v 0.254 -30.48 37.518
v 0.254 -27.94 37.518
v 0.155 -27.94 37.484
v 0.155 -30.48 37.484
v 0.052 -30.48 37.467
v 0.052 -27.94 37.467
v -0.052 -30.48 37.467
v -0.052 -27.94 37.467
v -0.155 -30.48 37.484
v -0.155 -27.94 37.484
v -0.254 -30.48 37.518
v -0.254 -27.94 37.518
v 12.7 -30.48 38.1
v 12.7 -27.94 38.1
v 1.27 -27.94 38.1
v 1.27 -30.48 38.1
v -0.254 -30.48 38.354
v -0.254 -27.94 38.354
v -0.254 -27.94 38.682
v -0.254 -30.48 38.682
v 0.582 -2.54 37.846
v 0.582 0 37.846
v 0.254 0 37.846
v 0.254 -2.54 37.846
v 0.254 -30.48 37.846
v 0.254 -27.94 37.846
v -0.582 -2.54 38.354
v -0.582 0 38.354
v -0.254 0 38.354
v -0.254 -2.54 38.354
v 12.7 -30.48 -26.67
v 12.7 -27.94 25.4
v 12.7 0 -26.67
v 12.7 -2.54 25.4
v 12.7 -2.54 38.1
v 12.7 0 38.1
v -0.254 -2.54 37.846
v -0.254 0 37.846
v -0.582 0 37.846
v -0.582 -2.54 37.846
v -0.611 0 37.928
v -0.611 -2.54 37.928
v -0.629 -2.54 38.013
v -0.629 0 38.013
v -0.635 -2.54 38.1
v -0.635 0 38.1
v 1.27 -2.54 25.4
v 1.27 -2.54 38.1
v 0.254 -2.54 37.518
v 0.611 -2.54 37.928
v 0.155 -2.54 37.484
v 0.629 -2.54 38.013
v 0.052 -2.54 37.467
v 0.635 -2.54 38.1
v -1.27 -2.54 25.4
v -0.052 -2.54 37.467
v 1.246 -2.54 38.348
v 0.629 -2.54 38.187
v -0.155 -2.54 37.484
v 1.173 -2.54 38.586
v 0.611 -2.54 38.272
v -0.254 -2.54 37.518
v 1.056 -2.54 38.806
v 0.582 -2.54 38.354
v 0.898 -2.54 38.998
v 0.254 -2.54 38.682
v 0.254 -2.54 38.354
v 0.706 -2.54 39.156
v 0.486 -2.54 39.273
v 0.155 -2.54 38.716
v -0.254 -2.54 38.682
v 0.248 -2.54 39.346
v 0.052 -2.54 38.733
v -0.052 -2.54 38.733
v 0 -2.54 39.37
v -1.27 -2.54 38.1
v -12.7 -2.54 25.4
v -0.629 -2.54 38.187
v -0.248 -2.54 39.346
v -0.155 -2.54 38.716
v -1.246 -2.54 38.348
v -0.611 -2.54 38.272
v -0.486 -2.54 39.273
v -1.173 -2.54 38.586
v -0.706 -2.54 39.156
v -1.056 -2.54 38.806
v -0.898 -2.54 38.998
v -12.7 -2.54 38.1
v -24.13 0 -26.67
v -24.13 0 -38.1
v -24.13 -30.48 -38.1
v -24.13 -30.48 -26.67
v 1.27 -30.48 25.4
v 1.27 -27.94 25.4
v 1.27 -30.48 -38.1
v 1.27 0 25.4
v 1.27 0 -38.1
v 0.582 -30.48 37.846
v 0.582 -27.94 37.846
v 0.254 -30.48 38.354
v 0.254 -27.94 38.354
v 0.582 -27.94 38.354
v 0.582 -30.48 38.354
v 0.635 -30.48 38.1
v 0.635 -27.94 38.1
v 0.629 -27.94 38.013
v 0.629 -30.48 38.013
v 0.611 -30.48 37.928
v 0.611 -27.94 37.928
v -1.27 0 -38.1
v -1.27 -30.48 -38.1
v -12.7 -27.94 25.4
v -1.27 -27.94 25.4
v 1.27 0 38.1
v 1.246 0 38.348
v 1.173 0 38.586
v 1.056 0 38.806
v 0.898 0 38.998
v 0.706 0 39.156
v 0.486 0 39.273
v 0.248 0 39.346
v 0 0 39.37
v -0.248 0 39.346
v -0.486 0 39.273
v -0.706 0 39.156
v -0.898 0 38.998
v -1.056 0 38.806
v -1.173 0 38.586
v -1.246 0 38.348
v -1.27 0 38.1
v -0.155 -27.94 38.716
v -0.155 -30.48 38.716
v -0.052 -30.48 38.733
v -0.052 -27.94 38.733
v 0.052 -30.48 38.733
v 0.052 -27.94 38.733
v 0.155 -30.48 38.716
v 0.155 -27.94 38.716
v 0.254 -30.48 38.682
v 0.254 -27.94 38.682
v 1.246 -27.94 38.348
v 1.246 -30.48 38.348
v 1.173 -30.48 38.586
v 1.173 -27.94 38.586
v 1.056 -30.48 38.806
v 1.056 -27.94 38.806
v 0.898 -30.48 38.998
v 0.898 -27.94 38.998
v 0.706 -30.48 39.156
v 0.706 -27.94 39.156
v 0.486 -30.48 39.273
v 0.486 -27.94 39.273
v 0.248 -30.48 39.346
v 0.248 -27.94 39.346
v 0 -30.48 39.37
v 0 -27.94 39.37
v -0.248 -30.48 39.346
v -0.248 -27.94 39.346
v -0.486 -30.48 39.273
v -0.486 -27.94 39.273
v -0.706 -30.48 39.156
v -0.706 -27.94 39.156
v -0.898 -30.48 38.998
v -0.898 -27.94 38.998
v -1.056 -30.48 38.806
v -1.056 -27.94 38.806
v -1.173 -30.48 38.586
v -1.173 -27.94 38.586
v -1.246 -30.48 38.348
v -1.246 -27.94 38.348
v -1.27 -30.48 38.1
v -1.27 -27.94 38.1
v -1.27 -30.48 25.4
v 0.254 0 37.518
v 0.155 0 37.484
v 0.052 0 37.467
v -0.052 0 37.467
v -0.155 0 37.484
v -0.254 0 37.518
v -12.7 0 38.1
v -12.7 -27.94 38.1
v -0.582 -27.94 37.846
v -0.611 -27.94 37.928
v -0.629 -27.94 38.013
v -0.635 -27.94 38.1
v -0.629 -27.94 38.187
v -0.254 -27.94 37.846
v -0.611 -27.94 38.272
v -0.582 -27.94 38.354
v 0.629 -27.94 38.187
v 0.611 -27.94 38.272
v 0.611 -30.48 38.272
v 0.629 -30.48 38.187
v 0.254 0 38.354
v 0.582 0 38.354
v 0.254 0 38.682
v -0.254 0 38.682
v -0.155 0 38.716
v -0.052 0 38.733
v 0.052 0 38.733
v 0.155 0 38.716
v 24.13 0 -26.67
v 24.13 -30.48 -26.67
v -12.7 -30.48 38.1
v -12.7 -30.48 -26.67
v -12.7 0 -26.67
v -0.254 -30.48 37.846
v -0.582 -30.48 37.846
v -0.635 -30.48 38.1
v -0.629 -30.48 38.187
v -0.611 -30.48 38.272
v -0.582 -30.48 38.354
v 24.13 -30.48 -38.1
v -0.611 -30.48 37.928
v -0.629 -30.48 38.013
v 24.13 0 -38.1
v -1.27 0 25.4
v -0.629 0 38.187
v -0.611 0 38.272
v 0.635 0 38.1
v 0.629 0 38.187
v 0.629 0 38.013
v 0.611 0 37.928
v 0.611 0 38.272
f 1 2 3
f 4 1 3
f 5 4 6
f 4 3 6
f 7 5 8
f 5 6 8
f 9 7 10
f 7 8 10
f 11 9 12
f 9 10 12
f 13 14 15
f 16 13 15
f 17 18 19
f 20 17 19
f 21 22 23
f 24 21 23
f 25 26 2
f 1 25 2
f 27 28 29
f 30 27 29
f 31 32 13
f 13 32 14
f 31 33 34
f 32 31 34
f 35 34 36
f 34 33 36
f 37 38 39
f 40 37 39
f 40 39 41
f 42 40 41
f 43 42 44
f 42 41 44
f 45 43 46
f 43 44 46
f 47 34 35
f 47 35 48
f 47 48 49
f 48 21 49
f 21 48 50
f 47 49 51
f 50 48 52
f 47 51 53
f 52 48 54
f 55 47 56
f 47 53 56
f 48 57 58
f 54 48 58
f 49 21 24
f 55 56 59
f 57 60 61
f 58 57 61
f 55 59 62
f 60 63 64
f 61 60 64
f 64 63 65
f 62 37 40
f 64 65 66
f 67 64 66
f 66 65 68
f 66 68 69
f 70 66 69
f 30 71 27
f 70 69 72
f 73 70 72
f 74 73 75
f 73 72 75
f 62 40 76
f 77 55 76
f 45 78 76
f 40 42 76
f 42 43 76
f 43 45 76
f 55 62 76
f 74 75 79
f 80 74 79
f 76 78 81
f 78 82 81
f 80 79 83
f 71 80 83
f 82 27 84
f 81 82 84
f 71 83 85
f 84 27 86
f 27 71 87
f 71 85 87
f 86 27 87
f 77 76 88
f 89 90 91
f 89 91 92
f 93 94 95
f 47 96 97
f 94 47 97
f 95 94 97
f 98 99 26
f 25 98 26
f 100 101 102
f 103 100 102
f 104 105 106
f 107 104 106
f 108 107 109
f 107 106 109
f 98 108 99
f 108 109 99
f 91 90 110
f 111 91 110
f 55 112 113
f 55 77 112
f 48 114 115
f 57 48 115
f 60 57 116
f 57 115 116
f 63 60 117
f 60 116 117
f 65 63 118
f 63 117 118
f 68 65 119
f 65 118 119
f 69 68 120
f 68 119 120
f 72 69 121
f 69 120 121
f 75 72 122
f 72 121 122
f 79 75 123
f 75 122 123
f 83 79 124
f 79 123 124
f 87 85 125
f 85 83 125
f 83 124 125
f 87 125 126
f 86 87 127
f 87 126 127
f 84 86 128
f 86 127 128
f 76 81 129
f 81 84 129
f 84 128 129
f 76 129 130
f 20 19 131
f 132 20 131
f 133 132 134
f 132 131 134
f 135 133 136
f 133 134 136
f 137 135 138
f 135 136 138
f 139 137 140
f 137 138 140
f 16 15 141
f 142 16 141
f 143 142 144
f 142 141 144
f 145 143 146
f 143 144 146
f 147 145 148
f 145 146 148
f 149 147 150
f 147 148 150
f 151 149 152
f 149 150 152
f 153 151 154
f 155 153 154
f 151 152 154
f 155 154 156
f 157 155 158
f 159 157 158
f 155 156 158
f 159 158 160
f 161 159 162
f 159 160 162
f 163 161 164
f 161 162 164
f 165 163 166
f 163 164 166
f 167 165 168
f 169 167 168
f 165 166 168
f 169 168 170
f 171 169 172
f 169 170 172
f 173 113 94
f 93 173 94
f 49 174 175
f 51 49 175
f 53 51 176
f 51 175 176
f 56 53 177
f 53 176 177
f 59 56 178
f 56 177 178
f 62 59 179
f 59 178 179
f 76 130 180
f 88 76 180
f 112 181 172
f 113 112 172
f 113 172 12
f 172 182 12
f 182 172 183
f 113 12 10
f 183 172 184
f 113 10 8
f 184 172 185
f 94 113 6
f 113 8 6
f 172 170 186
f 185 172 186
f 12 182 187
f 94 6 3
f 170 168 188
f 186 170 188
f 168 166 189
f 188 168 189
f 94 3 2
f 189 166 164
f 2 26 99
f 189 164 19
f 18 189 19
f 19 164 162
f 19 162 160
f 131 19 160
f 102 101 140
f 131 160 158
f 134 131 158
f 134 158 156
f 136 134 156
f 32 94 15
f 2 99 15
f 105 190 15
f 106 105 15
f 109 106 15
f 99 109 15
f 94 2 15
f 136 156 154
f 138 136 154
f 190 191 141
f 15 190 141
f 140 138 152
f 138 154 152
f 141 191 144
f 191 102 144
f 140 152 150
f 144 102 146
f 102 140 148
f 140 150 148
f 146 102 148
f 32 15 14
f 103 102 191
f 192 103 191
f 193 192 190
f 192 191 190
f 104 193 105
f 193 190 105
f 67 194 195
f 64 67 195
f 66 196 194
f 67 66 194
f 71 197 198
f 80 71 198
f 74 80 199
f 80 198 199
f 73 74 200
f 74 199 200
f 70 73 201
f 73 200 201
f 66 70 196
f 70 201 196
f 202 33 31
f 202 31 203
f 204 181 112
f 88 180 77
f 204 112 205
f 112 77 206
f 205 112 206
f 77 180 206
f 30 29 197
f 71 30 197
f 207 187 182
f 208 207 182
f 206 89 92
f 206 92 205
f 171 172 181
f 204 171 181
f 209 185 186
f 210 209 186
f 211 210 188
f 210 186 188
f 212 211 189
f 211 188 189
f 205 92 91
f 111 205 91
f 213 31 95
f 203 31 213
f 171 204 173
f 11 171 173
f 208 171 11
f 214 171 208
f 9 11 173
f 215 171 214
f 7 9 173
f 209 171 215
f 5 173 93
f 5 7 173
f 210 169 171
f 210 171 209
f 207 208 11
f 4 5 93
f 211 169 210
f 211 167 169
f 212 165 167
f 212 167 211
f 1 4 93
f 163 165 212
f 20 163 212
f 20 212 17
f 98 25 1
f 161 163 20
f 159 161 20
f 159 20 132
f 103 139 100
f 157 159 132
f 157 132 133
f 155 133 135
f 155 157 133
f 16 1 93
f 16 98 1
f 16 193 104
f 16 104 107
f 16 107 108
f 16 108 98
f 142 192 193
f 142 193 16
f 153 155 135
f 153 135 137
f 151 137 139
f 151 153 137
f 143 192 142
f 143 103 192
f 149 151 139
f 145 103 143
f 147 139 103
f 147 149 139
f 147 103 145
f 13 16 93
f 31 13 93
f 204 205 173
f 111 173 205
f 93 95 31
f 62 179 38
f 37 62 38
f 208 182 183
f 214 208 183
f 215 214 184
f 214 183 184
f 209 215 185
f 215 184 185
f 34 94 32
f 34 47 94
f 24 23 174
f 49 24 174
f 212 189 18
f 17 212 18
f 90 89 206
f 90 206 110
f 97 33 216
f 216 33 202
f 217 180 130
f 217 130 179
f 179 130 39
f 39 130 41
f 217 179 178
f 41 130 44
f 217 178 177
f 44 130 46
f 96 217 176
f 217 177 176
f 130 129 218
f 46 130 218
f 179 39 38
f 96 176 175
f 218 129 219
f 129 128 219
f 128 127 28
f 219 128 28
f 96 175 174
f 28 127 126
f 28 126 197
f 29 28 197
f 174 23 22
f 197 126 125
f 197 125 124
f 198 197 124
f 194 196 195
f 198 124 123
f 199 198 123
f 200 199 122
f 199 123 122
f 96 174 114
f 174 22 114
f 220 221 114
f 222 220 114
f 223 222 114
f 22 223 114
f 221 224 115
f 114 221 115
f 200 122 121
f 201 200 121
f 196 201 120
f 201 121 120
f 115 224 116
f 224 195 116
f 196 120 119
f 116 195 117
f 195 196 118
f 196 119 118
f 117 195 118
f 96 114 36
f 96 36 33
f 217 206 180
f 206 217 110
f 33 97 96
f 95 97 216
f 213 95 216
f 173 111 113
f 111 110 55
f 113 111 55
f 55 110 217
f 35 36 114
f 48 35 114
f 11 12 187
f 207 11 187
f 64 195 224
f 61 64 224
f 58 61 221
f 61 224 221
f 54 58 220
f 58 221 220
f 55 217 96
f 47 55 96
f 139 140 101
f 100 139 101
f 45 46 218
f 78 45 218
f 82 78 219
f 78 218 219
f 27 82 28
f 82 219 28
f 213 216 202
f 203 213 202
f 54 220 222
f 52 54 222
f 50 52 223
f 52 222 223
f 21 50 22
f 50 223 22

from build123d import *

# Parameters (mm, degrees)
F0_W          = 11.43
F0_H          = 11.43
F1_DEPTH      = 30.48
F3_DEPTH      = 12.7
F3_DEPTH_BACK = 25.4


with BuildPart() as f1:
    # F0 (on Front) → F1 (new body)
    with BuildSketch(Plane.XZ):
        with BuildLine():
            Line((12.7, 38.1), (1.27, 38.1))
            ThreePointArc((1.27, 38.1), (0, 36.83), (-1.27, 38.1))
            Line((-1.27, 38.1), (-12.7, 38.1))
            Line((-12.7, 38.1), (-12.7, -26.67))
            Line((-12.7, -26.67), (-1.27, -26.67))
            Line((-1.27, -26.67), (-1.27, 25.4))
            Line((-1.27, 25.4), (1.27, 25.4))
            Line((1.27, 25.4), (1.27, -26.67))
            Line((1.27, -26.67), (12.7, -26.67))
            Line((12.7, -26.67), (12.7, 38.1))
        make_face()
        with BuildLine():
            ThreePointArc((-1.27, 38.1), (0, 36.83), (1.27, 38.1))
            Line((1.27, 38.1), (0.909717055, 38.1))
            Line((0.909717055, 38.1), (0.909717055, 37.846))
            Line((0.909717055, 37.846), (0.5819871133, 37.846))
            ThreePointArc((0.5819871133, 37.846), (0.4490128061, 37.6509871939), (0.254, 37.5180128867))
            Line((0.254, 37.5180128867), (0.254, 37.3829295754))
            Line((0.254, 37.3829295754), (-0.254, 37.3829295754))
            Line((-0.254, 37.3829295754), (-0.254, 37.5180128867))
            ThreePointArc((-0.254, 37.5180128867), (-0.4490128061, 37.6509871939), (-0.5819871133, 37.846))
            Line((-0.5819871133, 37.846), (-0.909717055, 37.846))
            Line((-0.909717055, 37.846), (-0.909717055, 38.1))
            Line((-0.909717055, 38.1), (-1.27, 38.1))
        make_face()
        with Locations((-6.985, -32.385)):
            Rectangle(F0_W, F0_H)
        with Locations((-18.415, -32.385)):
            Rectangle(F0_W, F0_H)
        with Locations((6.985, -32.385)):
            Rectangle(F0_W, F0_H)
        with Locations((18.415, -32.385)):
            Rectangle(F0_W, F0_H)
        with BuildLine():
            Line((0.909717055, 38.1), (1.27, 38.1))
            ThreePointArc((1.27, 38.1), (0, 39.37), (-1.27, 38.1))
            Line((-1.27, 38.1), (-0.909717055, 38.1))
            Line((-0.909717055, 38.1), (-0.909717055, 38.354))
            Line((-0.909717055, 38.354), (-0.5819871133, 38.354))
            ThreePointArc((-0.5819871133, 38.354), (-0.4490128061, 38.5490128061), (-0.254, 38.6819871133))
            Line((-0.254, 38.6819871133), (-0.254, 38.8170704246))
            Line((-0.254, 38.8170704246), (0.254, 38.8170704246))
            Line((0.254, 38.8170704246), (0.254, 38.6819871133))
            ThreePointArc((0.254, 38.6819871133), (0.4490128061, 38.5490128061), (0.5819871133, 38.354))
            Line((0.5819871133, 38.354), (0.909717055, 38.354))
            Line((0.909717055, 38.354), (0.909717055, 38.1))
        make_face()
        with BuildLine():
            Line((-0.635, 38.1), (-0.909717055, 38.1))
            Line((-0.909717055, 38.1), (-0.909717055, 37.846))
            Line((-0.909717055, 37.846), (-0.5819871133, 37.846))
            ThreePointArc((-0.5819871133, 37.846), (-0.6216055087, 37.9702633763), (-0.635, 38.1))
        make_face()
        with BuildLine():
            Line((-0.909717055, 38.354), (-0.909717055, 38.1))
            Line((-0.909717055, 38.1), (-0.635, 38.1))
            ThreePointArc((-0.635, 38.1), (-0.6216055087, 38.2297366237), (-0.5819871133, 38.354))
            Line((-0.5819871133, 38.354), (-0.909717055, 38.354))
        make_face()
        with BuildLine():
            ThreePointArc((-0.254, 38.6819871133), (-0.4490128061, 38.5490128061), (-0.5819871133, 38.354))
            Line((-0.5819871133, 38.354), (-0.254, 38.354))
            Line((-0.254, 38.354), (-0.254, 38.6819871133))
        make_face()
        with BuildLine():
            Line((0.254, 38.354), (0.5819871133, 38.354))
            ThreePointArc((0.5819871133, 38.354), (0.4490128061, 38.5490128061), (0.254, 38.6819871133))
            Line((0.254, 38.6819871133), (0.254, 38.354))
        make_face()
        with BuildLine():
            Line((0.635, 38.1), (0.909717055, 38.1))
            Line((0.909717055, 38.1), (0.909717055, 38.354))
            Line((0.909717055, 38.354), (0.5819871133, 38.354))
            ThreePointArc((0.5819871133, 38.354), (0.6216055087, 38.2297366237), (0.635, 38.1))
        make_face()
        with BuildLine():
            Line((0.909717055, 37.846), (0.909717055, 38.1))
            Line((0.909717055, 38.1), (0.635, 38.1))
            ThreePointArc((0.635, 38.1), (0.6216055087, 37.9702633763), (0.5819871133, 37.846))
            Line((0.5819871133, 37.846), (0.909717055, 37.846))
        make_face()
        with BuildLine():
            ThreePointArc((0.254, 37.5180128867), (0.4490128061, 37.6509871939), (0.5819871133, 37.846))
            Line((0.5819871133, 37.846), (0.254, 37.846))
            Line((0.254, 37.846), (0.254, 37.5180128867))
        make_face()
        with BuildLine():
            Line((0.254, 37.3829295754), (0.254, 37.5180128867))
            ThreePointArc((0.254, 37.5180128867), (0, 37.465), (-0.254, 37.5180128867))
            Line((-0.254, 37.5180128867), (-0.254, 37.3829295754))
            Line((-0.254, 37.3829295754), (0.254, 37.3829295754))
        make_face()
        with BuildLine():
            ThreePointArc((-0.254, 38.6819871133), (0, 38.735), (0.254, 38.6819871133))
            Line((0.254, 38.6819871133), (0.254, 38.8170704246))
            Line((0.254, 38.8170704246), (-0.254, 38.8170704246))
            Line((-0.254, 38.8170704246), (-0.254, 38.6819871133))
        make_face()
        with BuildLine():
            Line((-0.254, 37.846), (-0.5819871133, 37.846))
            ThreePointArc((-0.5819871133, 37.846), (-0.4490128061, 37.6509871939), (-0.254, 37.5180128867))
            Line((-0.254, 37.5180128867), (-0.254, 37.846))
        make_face()
    extrude(amount=F1_DEPTH)

    # F2 (on face) → F3 (cut, two sides)
    with BuildSketch(Plane.XY.offset(38.1)) as f3_sk:
        Polygon((12.7, -27.94), (12.7, -2.54), (-6.985, -2.54), (-26.67, -2.54), (-26.67, -27.94), align=None)
    extrude(amount=-F3_DEPTH, mode=Mode.SUBTRACT)
    extrude(f3_sk.sketch, amount=F3_DEPTH_BACK, mode=Mode.SUBTRACT)


solid = f1.part
